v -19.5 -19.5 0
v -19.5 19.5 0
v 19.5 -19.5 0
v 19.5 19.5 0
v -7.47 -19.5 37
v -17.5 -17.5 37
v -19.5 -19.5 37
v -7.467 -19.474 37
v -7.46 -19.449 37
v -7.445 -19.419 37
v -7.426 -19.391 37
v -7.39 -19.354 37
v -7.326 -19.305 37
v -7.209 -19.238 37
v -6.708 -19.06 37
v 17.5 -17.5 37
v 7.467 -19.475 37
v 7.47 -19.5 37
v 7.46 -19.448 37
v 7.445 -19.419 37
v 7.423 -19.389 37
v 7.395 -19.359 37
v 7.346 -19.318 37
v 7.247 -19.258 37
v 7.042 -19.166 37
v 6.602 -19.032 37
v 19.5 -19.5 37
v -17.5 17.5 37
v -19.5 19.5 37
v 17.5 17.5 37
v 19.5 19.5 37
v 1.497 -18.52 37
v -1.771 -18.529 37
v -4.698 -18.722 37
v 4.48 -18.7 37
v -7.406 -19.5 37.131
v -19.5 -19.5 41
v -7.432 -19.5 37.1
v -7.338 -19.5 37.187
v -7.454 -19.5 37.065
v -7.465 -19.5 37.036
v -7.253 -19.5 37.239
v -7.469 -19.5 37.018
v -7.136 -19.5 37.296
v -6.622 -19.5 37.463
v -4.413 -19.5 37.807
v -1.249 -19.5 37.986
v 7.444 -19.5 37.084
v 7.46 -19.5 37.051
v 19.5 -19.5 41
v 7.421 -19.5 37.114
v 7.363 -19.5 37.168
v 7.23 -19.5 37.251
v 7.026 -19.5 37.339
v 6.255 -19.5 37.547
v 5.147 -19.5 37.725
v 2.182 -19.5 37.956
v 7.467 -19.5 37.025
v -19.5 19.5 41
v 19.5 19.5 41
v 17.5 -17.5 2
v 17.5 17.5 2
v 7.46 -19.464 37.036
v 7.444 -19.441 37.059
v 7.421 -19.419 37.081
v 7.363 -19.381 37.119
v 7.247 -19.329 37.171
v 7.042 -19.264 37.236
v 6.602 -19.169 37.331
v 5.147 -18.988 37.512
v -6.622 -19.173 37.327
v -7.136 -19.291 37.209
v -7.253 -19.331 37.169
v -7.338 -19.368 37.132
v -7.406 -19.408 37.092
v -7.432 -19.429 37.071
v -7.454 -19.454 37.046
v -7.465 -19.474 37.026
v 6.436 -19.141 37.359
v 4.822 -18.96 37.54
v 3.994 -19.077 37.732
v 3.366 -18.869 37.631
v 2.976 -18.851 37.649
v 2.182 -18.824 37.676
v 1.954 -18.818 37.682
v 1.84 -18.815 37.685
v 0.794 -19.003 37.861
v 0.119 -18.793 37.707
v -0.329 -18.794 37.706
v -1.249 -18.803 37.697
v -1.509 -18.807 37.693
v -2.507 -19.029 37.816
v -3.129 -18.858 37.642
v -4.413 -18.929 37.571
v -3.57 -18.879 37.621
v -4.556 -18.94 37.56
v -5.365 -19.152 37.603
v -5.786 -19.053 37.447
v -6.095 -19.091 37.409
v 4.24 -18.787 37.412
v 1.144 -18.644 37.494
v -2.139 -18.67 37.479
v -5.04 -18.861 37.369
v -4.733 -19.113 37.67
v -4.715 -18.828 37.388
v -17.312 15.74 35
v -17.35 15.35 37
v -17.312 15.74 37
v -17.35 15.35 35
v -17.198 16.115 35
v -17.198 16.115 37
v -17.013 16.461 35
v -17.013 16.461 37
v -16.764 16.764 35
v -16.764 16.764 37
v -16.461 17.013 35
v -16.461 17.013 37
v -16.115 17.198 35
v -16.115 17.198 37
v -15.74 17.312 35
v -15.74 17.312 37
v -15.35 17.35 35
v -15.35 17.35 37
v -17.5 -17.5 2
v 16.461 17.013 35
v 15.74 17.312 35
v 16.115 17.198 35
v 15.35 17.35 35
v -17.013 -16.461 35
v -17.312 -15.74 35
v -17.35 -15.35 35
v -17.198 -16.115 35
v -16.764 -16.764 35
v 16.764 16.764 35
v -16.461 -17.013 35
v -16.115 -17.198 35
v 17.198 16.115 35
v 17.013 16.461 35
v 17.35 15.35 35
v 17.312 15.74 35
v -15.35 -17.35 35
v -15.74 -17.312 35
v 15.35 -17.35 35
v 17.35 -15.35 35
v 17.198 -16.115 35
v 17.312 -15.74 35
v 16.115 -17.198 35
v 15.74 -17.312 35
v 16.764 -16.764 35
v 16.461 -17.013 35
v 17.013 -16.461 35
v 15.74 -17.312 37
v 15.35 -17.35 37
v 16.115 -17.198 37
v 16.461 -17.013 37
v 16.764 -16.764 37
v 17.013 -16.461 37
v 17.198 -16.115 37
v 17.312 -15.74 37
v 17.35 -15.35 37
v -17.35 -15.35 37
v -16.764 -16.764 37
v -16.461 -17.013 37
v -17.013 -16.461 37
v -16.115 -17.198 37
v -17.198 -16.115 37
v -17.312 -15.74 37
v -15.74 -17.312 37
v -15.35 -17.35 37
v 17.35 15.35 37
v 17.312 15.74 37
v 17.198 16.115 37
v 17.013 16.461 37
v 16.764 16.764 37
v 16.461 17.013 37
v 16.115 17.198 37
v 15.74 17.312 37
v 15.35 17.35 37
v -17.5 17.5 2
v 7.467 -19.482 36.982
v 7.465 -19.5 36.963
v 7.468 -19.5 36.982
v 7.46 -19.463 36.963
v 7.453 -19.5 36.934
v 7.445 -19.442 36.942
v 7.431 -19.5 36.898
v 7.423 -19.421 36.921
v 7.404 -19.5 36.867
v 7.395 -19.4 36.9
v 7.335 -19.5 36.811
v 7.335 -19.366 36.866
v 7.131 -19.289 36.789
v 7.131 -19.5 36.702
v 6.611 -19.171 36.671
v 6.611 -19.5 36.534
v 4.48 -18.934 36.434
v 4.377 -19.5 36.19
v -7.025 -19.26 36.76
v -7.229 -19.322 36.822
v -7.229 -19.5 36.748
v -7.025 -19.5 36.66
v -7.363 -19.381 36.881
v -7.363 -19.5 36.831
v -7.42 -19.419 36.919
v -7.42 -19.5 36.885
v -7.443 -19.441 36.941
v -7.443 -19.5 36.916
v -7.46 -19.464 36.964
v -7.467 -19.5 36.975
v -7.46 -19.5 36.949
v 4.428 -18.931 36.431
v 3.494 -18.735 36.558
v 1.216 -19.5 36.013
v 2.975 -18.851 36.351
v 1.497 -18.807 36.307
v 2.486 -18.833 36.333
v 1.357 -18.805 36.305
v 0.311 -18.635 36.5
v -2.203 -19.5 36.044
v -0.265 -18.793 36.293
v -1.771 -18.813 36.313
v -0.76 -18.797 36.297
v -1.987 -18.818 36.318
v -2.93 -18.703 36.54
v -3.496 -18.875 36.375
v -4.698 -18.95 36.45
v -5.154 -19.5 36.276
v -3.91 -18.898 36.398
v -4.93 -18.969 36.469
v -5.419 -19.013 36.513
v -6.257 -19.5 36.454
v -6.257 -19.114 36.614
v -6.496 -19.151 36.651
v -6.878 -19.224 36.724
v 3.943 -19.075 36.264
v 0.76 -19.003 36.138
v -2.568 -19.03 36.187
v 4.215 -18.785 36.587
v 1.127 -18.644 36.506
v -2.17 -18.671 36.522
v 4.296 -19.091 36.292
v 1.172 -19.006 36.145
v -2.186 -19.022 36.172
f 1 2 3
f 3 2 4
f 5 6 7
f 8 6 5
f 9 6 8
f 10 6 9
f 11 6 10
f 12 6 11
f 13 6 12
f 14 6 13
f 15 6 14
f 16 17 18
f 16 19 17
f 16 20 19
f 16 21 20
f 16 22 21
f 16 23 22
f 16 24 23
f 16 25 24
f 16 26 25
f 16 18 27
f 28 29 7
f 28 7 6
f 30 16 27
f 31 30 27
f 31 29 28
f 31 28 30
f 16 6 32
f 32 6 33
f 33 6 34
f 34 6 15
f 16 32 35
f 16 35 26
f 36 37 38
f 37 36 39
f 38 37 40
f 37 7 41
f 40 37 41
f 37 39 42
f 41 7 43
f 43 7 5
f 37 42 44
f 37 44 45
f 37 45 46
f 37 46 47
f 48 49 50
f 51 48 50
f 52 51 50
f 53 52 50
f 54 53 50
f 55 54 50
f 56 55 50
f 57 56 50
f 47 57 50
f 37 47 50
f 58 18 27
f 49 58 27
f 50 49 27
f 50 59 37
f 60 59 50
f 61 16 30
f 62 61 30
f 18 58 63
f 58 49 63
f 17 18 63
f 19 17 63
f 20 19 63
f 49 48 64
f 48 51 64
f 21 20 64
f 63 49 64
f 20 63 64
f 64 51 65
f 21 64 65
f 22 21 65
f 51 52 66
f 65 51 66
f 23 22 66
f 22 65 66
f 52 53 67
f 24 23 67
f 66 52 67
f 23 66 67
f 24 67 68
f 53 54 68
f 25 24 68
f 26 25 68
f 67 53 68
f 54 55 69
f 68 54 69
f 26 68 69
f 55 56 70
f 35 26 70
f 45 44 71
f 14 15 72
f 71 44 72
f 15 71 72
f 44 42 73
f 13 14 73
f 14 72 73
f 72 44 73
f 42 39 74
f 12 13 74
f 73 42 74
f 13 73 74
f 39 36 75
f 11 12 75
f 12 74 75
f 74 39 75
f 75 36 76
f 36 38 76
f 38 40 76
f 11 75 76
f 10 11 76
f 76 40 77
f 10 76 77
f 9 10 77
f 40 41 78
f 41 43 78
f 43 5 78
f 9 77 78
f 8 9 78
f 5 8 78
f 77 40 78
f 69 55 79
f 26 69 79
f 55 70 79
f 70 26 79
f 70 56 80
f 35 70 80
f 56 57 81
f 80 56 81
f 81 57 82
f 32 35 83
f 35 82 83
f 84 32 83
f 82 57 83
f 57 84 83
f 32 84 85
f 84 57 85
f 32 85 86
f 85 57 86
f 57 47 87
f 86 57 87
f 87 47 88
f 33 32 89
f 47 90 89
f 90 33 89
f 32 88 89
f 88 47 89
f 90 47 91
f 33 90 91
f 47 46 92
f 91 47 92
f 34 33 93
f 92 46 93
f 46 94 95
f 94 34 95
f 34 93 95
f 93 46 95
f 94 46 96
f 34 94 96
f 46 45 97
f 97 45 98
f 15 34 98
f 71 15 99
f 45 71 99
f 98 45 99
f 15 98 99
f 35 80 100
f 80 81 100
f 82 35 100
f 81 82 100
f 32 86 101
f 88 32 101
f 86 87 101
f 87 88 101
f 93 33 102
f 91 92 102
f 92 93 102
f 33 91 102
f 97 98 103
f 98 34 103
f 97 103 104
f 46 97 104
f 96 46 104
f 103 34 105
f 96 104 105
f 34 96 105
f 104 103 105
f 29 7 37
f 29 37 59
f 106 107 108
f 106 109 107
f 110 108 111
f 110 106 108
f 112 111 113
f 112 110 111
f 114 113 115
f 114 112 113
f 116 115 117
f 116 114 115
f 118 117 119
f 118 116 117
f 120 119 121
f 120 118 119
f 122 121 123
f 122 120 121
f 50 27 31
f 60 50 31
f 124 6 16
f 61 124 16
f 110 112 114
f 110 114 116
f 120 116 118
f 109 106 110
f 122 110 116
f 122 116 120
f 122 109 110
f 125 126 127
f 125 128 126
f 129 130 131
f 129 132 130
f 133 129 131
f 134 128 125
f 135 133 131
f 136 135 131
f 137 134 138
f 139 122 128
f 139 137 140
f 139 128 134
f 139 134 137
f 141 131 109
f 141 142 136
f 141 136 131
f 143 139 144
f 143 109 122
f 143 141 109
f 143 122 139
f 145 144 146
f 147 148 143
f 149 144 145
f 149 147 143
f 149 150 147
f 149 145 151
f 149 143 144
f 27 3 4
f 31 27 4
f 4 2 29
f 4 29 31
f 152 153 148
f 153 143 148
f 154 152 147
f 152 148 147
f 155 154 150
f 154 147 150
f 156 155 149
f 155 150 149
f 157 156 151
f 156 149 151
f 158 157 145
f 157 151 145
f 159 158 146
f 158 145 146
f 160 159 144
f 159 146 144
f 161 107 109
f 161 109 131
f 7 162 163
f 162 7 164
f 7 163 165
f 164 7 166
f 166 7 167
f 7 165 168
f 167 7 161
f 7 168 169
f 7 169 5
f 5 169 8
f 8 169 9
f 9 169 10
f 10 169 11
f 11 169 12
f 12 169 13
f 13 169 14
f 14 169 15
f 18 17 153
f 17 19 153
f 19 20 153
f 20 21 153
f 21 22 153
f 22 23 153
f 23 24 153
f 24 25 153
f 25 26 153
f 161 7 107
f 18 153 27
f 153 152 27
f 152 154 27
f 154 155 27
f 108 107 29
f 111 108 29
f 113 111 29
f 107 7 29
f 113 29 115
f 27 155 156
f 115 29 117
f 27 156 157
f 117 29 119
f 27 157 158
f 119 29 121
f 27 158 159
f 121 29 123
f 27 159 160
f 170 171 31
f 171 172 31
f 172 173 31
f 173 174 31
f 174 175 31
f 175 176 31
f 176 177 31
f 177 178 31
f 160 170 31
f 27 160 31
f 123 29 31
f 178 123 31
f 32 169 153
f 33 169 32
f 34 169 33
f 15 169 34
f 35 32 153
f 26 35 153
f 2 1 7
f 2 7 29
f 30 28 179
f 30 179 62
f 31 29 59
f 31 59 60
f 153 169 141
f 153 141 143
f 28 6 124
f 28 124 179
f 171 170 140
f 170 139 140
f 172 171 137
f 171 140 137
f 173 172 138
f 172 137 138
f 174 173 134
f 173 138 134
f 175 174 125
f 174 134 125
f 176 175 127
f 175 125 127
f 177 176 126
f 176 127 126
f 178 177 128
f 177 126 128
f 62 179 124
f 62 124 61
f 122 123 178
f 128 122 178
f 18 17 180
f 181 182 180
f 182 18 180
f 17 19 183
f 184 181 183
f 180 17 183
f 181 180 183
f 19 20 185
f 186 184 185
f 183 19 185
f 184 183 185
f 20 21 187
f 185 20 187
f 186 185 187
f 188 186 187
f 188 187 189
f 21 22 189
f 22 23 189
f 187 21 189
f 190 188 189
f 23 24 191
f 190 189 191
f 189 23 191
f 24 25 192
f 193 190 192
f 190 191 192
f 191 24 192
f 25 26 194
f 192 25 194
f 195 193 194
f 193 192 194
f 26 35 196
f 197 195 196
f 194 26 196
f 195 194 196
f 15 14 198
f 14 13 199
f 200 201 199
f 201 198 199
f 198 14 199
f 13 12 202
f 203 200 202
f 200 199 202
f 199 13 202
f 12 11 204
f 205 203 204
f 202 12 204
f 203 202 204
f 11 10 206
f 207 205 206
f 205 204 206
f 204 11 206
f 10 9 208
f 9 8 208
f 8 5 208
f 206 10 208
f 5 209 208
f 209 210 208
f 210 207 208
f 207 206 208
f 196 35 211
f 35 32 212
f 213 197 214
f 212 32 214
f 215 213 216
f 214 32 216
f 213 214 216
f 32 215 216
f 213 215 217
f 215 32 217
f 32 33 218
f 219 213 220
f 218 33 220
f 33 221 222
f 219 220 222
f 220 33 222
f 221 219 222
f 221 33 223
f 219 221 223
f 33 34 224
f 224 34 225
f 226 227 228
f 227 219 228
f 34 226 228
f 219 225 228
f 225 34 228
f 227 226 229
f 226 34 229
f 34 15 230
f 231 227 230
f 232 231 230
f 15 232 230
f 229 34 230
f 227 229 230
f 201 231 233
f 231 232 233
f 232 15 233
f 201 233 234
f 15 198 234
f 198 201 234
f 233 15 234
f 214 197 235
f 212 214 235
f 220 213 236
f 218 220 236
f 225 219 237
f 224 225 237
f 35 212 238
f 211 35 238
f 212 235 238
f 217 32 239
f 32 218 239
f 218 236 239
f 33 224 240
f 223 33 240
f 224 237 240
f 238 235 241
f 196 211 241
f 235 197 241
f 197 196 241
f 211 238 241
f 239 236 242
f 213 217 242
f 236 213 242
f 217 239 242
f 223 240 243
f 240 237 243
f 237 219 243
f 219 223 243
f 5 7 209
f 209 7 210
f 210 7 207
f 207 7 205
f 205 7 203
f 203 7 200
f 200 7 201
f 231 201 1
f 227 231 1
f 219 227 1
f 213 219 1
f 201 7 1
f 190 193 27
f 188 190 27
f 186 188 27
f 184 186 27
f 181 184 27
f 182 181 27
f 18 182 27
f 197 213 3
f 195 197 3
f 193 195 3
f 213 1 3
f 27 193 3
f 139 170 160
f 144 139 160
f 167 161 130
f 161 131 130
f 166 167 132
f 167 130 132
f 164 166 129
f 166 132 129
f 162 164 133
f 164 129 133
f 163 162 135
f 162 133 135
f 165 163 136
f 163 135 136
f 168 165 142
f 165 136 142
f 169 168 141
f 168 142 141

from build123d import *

# Parameters (mm, degrees)
F0_W     = 39
F0_H     = 39
F1_DEPTH = 37
F2_W     = 35
F2_H     = 35
F3_DEPTH = 35
F4_W     = 39
F4_H     = 39
F5_DEPTH = 4
F6_W     = 34.7
F6_H     = 34.7
F7_DEPTH = 2
F8_R     = 2


with BuildPart() as f1:
    # F0 (on Top) → F1 (new body)
    with BuildSketch(Plane.XY):
        Rectangle(F0_W, F0_H)
    extrude(amount=F1_DEPTH)

    # F2 (on face) → F3 (cut)
    with BuildSketch(Plane.XY.offset(37)):
        Rectangle(F2_W, F2_H)
    extrude(amount=-F3_DEPTH, mode=Mode.SUBTRACT)


with BuildPart() as f5:
    # F4 (on face) → F5 (new body)
    with BuildSketch(Plane.XY.offset(37)):
        Rectangle(F4_W, F4_H)
    extrude(amount=F5_DEPTH)

    # F6 (on face) → F7 (join)
    with BuildSketch(Plane(origin=(0, 0, 37), x_dir=(1, 0, 0), z_dir=(0, 0, -1))):
        Rectangle(F6_W, F6_H)
    extrude(amount=F7_DEPTH)

    # F8
    f8_edges = [f5.edges().sort_by_distance(p)[0] for p in [
        (-17.35, -17.35, 36),
        (17.35, -17.35, 36),
        (-17.35, 17.35, 36),
        (17.35, 17.35, 36),
    ]]
    fillet(f8_edges, radius=F8_R)


with BuildPart() as f10:
    # F9 (on face) → F10 (revolve)
    with BuildSketch(Plane.XY.offset(37)):
        with BuildLine():
            Line((-7.4697477275, -19.5), (7.4697477275, -19.5))
            add(Edge.make_bspline(
                [(7.4697477275, -19.5), (7.4697477275, -18.5), (0, -18.5), (-7.4697477275, -18.5), (-7.4697477275, -19.5)],
                knots=[0, 0, 0, 1.5707963268, 1.5707963268, 3.1415926536, 3.1415926536, 3.1415926536], degree=2, weights=[1, 0.7071067812, 1, 0.7071067812, 1]))
        make_face()
    revolve(axis=Axis((0, -19.5, 37), (-1, 0, 0)))


with BuildPart() as f5_1:
    add(f5.part)

    # F11: cut F10
    add(f10.part, mode=Mode.SUBTRACT)


with BuildPart() as f1_1:
    add(f1.part)

    # F11: cut F10
    add(f10.part, mode=Mode.SUBTRACT)


solid = Compound([f5_1.part, f1_1.part])
